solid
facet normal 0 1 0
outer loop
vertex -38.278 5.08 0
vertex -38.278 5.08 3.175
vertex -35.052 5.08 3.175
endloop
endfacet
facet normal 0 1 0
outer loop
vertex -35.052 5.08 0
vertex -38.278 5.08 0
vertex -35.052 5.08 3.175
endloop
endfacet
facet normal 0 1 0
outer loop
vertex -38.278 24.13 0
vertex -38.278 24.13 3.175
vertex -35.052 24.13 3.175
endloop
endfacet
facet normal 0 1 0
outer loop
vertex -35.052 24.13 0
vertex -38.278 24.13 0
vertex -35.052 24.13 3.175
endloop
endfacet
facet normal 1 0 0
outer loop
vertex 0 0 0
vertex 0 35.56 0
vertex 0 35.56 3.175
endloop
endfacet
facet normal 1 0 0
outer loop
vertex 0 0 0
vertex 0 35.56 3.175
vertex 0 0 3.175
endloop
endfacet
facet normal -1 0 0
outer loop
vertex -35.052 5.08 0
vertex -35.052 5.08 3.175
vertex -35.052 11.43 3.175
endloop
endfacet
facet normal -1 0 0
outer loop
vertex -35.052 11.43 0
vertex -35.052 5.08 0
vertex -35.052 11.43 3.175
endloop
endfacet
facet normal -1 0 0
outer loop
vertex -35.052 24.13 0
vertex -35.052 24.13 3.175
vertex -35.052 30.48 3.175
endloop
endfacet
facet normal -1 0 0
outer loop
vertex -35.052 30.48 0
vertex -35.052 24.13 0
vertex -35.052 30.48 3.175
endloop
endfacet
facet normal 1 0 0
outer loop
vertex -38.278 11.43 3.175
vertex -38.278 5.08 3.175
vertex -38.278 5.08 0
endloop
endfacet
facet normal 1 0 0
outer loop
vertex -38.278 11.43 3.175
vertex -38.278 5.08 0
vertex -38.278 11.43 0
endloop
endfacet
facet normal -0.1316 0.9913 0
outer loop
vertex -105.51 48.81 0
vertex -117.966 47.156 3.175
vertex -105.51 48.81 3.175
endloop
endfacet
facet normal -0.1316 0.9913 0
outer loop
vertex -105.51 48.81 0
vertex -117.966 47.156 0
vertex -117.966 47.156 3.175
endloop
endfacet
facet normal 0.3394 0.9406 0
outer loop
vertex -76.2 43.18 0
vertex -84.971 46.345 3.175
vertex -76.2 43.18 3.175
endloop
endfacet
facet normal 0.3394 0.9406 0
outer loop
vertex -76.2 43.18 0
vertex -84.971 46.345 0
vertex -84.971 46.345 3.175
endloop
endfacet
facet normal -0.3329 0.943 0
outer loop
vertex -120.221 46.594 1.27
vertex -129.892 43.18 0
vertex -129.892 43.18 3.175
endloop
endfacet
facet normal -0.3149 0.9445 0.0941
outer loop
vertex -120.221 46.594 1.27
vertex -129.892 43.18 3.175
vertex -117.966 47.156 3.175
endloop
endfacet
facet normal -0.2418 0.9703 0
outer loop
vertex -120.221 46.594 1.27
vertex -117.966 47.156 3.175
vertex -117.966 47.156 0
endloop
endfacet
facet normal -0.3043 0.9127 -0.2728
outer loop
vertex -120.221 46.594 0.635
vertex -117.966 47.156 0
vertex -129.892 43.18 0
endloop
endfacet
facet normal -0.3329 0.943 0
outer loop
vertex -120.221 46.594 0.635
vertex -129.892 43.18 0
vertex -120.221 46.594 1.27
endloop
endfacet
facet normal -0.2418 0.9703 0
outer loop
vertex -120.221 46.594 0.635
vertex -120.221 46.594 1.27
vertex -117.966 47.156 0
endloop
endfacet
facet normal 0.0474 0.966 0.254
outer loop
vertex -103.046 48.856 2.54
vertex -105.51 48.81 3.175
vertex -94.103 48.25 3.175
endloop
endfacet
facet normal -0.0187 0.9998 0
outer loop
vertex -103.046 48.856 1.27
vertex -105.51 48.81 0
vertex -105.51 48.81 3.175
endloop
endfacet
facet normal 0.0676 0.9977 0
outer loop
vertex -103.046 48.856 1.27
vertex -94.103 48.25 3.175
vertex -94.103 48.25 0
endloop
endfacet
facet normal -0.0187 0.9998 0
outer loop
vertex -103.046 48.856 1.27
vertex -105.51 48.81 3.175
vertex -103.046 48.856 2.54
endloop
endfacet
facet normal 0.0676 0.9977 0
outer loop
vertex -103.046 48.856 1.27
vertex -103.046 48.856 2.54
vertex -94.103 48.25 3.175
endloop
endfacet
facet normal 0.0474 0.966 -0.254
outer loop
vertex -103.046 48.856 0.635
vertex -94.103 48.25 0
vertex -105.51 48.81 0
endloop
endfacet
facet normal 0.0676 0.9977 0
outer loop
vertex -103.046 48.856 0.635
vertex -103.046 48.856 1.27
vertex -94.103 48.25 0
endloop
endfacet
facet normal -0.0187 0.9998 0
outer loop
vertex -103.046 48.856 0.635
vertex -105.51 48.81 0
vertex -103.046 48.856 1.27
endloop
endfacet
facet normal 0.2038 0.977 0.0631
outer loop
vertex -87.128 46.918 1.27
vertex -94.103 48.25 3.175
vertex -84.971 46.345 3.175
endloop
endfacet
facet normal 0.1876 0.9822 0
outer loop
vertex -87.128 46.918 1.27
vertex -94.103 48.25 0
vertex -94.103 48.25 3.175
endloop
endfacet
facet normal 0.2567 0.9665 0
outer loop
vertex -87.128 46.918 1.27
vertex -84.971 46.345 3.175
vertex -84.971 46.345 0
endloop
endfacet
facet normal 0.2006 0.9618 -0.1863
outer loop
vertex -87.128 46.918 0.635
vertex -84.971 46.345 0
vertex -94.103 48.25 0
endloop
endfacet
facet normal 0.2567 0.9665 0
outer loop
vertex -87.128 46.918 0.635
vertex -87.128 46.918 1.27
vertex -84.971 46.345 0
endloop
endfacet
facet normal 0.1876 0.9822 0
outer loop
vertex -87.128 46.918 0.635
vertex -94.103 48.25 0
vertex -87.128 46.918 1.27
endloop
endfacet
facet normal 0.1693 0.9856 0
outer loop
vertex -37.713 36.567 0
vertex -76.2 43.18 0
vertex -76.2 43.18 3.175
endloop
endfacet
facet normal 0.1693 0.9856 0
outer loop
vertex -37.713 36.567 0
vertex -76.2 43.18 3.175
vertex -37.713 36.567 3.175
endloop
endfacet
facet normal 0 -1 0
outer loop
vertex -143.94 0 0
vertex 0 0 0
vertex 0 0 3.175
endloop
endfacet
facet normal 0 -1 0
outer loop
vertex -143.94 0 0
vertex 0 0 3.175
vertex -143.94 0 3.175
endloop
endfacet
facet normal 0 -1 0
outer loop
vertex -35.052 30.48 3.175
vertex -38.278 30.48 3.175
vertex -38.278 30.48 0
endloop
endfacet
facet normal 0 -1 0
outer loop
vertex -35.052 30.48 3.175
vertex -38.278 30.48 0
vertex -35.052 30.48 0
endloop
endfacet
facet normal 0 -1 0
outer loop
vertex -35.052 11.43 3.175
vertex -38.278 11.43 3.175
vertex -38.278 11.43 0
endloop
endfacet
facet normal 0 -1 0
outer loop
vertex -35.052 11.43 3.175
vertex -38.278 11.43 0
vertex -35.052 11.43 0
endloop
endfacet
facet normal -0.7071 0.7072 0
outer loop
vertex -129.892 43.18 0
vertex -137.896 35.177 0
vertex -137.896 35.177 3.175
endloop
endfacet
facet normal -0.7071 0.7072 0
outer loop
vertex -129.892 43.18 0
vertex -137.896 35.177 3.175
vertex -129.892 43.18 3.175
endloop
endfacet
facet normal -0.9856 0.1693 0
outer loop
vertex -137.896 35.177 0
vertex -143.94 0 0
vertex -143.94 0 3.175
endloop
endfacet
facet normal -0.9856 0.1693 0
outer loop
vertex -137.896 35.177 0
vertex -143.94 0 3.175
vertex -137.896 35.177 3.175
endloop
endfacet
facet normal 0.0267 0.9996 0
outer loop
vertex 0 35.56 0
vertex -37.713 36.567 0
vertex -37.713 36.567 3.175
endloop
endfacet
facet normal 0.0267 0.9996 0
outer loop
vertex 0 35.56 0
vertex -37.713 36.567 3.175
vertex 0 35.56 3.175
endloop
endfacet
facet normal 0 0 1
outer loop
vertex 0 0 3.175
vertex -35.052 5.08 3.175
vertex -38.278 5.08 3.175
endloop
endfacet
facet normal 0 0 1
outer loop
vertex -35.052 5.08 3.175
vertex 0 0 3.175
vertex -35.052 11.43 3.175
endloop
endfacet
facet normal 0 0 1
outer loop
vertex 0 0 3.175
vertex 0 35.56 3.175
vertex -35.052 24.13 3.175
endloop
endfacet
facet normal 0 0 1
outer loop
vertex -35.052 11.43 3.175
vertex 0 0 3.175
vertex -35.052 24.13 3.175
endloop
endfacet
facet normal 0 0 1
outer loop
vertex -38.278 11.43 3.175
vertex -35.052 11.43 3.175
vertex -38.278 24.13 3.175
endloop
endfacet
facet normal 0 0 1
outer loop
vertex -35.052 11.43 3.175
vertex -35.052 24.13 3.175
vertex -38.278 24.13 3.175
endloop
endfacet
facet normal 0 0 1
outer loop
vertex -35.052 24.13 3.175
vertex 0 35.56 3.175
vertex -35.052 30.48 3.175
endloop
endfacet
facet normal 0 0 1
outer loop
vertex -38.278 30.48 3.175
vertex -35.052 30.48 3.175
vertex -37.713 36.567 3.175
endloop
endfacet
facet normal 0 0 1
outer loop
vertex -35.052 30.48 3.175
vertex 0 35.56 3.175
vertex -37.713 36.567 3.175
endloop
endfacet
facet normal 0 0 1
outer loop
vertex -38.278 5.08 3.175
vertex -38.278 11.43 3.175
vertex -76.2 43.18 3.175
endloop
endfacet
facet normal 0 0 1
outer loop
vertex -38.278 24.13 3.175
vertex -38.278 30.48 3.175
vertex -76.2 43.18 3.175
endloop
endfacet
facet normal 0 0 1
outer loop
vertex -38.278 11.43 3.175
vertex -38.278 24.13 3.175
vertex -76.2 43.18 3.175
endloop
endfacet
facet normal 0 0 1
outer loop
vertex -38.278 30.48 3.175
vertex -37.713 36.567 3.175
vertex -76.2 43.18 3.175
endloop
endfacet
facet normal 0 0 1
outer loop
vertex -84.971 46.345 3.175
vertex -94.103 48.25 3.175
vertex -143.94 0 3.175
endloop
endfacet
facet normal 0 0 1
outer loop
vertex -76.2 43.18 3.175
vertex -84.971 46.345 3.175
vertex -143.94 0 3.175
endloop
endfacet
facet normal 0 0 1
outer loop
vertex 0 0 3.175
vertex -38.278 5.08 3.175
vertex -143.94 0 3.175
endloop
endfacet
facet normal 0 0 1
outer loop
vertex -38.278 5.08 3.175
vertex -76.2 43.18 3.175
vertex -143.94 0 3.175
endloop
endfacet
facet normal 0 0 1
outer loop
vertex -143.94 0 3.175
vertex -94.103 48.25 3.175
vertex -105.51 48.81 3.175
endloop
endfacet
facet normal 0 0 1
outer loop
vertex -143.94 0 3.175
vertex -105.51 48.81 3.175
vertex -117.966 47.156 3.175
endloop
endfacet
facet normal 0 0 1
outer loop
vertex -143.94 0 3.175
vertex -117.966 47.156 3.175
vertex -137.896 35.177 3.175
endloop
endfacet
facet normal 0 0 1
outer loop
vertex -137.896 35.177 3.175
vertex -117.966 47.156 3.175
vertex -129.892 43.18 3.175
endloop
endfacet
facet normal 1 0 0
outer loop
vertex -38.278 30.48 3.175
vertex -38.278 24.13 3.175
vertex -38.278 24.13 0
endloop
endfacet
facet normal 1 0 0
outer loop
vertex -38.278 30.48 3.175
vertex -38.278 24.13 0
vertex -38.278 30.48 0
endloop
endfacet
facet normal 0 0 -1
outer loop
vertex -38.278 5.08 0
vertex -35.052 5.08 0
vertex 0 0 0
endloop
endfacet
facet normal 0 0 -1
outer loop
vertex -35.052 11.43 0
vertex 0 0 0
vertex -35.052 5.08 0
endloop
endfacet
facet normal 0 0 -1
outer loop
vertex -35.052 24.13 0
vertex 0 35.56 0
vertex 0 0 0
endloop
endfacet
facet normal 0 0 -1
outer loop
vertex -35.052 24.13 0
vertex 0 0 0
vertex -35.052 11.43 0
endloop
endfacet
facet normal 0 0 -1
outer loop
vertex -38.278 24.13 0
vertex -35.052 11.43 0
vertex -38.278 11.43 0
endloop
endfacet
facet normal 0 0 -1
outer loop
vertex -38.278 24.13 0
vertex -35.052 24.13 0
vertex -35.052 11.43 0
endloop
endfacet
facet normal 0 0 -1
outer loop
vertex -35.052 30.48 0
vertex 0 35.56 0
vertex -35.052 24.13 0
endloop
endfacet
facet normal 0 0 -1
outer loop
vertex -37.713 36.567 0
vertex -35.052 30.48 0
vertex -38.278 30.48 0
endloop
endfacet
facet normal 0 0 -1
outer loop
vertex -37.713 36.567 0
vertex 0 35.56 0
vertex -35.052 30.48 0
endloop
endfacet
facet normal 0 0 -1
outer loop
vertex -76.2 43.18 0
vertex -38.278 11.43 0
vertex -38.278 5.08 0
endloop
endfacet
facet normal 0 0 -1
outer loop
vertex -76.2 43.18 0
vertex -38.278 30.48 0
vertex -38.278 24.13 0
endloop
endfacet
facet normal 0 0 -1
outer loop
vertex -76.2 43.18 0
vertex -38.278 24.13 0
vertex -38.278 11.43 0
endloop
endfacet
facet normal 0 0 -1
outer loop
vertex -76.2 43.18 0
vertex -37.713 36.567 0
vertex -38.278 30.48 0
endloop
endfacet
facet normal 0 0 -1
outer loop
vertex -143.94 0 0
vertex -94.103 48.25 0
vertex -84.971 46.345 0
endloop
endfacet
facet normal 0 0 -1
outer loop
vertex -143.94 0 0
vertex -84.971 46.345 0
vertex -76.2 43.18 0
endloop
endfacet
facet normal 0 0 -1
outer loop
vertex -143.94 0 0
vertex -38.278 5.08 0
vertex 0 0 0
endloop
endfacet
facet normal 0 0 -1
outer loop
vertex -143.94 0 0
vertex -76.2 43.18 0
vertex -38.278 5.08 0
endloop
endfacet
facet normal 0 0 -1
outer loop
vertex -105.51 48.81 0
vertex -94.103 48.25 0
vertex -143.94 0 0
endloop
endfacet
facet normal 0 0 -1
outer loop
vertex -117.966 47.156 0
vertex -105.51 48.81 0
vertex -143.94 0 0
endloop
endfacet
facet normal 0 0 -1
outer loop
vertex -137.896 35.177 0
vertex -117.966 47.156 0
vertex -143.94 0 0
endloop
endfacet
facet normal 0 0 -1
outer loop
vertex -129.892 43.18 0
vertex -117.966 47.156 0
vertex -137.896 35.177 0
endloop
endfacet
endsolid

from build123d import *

# Parameters (mm, degrees)
BOSS_EXTRUDE1_DEPTH  = 3.175
SKETCH3_W            = 3.2258
SKETCH3_H            = 6.35
HOLES_FOR_TABS_DEPTH = 4.1750001


with BuildPart() as part:
    # Sketch1 → Boss-Extrude1 (new body)
    with BuildSketch(Plane.XY):
        with BuildLine():
            Line((-76.2, 43.18), (-37.713355451, 36.56692496))
            Line((-37.713355451, 36.56692496), (0, 35.56))
            Line((0, 35.56), (0, 0))
            Line((0, 0), (-143.94013079, 0))
            Line((-143.94013079, 0), (-137.895807931, 35.176631753))
            Line((-137.895807931, 35.176631753), (-129.892439684, 43.18))
            add(Edge.make_bspline(
                [(-129.892439684, 43.18), (-123.632909294, 45.955986916), (-114.625709488, 48.362317243), (-103.247996656, 48.972136691), (-95.522501134, 48.59342086), (-86.411542659, 47.027463229), (-79.726058772, 44.740816459), (-76.2, 43.18)],
                knots=[0, 0, 0, 0, 0.371232541, 0.49990694, 0.617608528, 0.790714497, 1, 1, 1, 1], degree=3))
        make_face()
    extrude(amount=BOSS_EXTRUDE1_DEPTH)

    # Sketch3 → holes for tabs (cut, through all)
    with BuildSketch(Plane.XY.offset(3.175)):
        with Locations((-36.6649, 27.305)):
            Rectangle(SKETCH3_W, SKETCH3_H)
        with Locations((-36.6649, 8.255)):
            Rectangle(SKETCH3_W, SKETCH3_H)
    extrude(amount=-HOLES_FOR_TABS_DEPTH, mode=Mode.SUBTRACT)


solid = part.part
